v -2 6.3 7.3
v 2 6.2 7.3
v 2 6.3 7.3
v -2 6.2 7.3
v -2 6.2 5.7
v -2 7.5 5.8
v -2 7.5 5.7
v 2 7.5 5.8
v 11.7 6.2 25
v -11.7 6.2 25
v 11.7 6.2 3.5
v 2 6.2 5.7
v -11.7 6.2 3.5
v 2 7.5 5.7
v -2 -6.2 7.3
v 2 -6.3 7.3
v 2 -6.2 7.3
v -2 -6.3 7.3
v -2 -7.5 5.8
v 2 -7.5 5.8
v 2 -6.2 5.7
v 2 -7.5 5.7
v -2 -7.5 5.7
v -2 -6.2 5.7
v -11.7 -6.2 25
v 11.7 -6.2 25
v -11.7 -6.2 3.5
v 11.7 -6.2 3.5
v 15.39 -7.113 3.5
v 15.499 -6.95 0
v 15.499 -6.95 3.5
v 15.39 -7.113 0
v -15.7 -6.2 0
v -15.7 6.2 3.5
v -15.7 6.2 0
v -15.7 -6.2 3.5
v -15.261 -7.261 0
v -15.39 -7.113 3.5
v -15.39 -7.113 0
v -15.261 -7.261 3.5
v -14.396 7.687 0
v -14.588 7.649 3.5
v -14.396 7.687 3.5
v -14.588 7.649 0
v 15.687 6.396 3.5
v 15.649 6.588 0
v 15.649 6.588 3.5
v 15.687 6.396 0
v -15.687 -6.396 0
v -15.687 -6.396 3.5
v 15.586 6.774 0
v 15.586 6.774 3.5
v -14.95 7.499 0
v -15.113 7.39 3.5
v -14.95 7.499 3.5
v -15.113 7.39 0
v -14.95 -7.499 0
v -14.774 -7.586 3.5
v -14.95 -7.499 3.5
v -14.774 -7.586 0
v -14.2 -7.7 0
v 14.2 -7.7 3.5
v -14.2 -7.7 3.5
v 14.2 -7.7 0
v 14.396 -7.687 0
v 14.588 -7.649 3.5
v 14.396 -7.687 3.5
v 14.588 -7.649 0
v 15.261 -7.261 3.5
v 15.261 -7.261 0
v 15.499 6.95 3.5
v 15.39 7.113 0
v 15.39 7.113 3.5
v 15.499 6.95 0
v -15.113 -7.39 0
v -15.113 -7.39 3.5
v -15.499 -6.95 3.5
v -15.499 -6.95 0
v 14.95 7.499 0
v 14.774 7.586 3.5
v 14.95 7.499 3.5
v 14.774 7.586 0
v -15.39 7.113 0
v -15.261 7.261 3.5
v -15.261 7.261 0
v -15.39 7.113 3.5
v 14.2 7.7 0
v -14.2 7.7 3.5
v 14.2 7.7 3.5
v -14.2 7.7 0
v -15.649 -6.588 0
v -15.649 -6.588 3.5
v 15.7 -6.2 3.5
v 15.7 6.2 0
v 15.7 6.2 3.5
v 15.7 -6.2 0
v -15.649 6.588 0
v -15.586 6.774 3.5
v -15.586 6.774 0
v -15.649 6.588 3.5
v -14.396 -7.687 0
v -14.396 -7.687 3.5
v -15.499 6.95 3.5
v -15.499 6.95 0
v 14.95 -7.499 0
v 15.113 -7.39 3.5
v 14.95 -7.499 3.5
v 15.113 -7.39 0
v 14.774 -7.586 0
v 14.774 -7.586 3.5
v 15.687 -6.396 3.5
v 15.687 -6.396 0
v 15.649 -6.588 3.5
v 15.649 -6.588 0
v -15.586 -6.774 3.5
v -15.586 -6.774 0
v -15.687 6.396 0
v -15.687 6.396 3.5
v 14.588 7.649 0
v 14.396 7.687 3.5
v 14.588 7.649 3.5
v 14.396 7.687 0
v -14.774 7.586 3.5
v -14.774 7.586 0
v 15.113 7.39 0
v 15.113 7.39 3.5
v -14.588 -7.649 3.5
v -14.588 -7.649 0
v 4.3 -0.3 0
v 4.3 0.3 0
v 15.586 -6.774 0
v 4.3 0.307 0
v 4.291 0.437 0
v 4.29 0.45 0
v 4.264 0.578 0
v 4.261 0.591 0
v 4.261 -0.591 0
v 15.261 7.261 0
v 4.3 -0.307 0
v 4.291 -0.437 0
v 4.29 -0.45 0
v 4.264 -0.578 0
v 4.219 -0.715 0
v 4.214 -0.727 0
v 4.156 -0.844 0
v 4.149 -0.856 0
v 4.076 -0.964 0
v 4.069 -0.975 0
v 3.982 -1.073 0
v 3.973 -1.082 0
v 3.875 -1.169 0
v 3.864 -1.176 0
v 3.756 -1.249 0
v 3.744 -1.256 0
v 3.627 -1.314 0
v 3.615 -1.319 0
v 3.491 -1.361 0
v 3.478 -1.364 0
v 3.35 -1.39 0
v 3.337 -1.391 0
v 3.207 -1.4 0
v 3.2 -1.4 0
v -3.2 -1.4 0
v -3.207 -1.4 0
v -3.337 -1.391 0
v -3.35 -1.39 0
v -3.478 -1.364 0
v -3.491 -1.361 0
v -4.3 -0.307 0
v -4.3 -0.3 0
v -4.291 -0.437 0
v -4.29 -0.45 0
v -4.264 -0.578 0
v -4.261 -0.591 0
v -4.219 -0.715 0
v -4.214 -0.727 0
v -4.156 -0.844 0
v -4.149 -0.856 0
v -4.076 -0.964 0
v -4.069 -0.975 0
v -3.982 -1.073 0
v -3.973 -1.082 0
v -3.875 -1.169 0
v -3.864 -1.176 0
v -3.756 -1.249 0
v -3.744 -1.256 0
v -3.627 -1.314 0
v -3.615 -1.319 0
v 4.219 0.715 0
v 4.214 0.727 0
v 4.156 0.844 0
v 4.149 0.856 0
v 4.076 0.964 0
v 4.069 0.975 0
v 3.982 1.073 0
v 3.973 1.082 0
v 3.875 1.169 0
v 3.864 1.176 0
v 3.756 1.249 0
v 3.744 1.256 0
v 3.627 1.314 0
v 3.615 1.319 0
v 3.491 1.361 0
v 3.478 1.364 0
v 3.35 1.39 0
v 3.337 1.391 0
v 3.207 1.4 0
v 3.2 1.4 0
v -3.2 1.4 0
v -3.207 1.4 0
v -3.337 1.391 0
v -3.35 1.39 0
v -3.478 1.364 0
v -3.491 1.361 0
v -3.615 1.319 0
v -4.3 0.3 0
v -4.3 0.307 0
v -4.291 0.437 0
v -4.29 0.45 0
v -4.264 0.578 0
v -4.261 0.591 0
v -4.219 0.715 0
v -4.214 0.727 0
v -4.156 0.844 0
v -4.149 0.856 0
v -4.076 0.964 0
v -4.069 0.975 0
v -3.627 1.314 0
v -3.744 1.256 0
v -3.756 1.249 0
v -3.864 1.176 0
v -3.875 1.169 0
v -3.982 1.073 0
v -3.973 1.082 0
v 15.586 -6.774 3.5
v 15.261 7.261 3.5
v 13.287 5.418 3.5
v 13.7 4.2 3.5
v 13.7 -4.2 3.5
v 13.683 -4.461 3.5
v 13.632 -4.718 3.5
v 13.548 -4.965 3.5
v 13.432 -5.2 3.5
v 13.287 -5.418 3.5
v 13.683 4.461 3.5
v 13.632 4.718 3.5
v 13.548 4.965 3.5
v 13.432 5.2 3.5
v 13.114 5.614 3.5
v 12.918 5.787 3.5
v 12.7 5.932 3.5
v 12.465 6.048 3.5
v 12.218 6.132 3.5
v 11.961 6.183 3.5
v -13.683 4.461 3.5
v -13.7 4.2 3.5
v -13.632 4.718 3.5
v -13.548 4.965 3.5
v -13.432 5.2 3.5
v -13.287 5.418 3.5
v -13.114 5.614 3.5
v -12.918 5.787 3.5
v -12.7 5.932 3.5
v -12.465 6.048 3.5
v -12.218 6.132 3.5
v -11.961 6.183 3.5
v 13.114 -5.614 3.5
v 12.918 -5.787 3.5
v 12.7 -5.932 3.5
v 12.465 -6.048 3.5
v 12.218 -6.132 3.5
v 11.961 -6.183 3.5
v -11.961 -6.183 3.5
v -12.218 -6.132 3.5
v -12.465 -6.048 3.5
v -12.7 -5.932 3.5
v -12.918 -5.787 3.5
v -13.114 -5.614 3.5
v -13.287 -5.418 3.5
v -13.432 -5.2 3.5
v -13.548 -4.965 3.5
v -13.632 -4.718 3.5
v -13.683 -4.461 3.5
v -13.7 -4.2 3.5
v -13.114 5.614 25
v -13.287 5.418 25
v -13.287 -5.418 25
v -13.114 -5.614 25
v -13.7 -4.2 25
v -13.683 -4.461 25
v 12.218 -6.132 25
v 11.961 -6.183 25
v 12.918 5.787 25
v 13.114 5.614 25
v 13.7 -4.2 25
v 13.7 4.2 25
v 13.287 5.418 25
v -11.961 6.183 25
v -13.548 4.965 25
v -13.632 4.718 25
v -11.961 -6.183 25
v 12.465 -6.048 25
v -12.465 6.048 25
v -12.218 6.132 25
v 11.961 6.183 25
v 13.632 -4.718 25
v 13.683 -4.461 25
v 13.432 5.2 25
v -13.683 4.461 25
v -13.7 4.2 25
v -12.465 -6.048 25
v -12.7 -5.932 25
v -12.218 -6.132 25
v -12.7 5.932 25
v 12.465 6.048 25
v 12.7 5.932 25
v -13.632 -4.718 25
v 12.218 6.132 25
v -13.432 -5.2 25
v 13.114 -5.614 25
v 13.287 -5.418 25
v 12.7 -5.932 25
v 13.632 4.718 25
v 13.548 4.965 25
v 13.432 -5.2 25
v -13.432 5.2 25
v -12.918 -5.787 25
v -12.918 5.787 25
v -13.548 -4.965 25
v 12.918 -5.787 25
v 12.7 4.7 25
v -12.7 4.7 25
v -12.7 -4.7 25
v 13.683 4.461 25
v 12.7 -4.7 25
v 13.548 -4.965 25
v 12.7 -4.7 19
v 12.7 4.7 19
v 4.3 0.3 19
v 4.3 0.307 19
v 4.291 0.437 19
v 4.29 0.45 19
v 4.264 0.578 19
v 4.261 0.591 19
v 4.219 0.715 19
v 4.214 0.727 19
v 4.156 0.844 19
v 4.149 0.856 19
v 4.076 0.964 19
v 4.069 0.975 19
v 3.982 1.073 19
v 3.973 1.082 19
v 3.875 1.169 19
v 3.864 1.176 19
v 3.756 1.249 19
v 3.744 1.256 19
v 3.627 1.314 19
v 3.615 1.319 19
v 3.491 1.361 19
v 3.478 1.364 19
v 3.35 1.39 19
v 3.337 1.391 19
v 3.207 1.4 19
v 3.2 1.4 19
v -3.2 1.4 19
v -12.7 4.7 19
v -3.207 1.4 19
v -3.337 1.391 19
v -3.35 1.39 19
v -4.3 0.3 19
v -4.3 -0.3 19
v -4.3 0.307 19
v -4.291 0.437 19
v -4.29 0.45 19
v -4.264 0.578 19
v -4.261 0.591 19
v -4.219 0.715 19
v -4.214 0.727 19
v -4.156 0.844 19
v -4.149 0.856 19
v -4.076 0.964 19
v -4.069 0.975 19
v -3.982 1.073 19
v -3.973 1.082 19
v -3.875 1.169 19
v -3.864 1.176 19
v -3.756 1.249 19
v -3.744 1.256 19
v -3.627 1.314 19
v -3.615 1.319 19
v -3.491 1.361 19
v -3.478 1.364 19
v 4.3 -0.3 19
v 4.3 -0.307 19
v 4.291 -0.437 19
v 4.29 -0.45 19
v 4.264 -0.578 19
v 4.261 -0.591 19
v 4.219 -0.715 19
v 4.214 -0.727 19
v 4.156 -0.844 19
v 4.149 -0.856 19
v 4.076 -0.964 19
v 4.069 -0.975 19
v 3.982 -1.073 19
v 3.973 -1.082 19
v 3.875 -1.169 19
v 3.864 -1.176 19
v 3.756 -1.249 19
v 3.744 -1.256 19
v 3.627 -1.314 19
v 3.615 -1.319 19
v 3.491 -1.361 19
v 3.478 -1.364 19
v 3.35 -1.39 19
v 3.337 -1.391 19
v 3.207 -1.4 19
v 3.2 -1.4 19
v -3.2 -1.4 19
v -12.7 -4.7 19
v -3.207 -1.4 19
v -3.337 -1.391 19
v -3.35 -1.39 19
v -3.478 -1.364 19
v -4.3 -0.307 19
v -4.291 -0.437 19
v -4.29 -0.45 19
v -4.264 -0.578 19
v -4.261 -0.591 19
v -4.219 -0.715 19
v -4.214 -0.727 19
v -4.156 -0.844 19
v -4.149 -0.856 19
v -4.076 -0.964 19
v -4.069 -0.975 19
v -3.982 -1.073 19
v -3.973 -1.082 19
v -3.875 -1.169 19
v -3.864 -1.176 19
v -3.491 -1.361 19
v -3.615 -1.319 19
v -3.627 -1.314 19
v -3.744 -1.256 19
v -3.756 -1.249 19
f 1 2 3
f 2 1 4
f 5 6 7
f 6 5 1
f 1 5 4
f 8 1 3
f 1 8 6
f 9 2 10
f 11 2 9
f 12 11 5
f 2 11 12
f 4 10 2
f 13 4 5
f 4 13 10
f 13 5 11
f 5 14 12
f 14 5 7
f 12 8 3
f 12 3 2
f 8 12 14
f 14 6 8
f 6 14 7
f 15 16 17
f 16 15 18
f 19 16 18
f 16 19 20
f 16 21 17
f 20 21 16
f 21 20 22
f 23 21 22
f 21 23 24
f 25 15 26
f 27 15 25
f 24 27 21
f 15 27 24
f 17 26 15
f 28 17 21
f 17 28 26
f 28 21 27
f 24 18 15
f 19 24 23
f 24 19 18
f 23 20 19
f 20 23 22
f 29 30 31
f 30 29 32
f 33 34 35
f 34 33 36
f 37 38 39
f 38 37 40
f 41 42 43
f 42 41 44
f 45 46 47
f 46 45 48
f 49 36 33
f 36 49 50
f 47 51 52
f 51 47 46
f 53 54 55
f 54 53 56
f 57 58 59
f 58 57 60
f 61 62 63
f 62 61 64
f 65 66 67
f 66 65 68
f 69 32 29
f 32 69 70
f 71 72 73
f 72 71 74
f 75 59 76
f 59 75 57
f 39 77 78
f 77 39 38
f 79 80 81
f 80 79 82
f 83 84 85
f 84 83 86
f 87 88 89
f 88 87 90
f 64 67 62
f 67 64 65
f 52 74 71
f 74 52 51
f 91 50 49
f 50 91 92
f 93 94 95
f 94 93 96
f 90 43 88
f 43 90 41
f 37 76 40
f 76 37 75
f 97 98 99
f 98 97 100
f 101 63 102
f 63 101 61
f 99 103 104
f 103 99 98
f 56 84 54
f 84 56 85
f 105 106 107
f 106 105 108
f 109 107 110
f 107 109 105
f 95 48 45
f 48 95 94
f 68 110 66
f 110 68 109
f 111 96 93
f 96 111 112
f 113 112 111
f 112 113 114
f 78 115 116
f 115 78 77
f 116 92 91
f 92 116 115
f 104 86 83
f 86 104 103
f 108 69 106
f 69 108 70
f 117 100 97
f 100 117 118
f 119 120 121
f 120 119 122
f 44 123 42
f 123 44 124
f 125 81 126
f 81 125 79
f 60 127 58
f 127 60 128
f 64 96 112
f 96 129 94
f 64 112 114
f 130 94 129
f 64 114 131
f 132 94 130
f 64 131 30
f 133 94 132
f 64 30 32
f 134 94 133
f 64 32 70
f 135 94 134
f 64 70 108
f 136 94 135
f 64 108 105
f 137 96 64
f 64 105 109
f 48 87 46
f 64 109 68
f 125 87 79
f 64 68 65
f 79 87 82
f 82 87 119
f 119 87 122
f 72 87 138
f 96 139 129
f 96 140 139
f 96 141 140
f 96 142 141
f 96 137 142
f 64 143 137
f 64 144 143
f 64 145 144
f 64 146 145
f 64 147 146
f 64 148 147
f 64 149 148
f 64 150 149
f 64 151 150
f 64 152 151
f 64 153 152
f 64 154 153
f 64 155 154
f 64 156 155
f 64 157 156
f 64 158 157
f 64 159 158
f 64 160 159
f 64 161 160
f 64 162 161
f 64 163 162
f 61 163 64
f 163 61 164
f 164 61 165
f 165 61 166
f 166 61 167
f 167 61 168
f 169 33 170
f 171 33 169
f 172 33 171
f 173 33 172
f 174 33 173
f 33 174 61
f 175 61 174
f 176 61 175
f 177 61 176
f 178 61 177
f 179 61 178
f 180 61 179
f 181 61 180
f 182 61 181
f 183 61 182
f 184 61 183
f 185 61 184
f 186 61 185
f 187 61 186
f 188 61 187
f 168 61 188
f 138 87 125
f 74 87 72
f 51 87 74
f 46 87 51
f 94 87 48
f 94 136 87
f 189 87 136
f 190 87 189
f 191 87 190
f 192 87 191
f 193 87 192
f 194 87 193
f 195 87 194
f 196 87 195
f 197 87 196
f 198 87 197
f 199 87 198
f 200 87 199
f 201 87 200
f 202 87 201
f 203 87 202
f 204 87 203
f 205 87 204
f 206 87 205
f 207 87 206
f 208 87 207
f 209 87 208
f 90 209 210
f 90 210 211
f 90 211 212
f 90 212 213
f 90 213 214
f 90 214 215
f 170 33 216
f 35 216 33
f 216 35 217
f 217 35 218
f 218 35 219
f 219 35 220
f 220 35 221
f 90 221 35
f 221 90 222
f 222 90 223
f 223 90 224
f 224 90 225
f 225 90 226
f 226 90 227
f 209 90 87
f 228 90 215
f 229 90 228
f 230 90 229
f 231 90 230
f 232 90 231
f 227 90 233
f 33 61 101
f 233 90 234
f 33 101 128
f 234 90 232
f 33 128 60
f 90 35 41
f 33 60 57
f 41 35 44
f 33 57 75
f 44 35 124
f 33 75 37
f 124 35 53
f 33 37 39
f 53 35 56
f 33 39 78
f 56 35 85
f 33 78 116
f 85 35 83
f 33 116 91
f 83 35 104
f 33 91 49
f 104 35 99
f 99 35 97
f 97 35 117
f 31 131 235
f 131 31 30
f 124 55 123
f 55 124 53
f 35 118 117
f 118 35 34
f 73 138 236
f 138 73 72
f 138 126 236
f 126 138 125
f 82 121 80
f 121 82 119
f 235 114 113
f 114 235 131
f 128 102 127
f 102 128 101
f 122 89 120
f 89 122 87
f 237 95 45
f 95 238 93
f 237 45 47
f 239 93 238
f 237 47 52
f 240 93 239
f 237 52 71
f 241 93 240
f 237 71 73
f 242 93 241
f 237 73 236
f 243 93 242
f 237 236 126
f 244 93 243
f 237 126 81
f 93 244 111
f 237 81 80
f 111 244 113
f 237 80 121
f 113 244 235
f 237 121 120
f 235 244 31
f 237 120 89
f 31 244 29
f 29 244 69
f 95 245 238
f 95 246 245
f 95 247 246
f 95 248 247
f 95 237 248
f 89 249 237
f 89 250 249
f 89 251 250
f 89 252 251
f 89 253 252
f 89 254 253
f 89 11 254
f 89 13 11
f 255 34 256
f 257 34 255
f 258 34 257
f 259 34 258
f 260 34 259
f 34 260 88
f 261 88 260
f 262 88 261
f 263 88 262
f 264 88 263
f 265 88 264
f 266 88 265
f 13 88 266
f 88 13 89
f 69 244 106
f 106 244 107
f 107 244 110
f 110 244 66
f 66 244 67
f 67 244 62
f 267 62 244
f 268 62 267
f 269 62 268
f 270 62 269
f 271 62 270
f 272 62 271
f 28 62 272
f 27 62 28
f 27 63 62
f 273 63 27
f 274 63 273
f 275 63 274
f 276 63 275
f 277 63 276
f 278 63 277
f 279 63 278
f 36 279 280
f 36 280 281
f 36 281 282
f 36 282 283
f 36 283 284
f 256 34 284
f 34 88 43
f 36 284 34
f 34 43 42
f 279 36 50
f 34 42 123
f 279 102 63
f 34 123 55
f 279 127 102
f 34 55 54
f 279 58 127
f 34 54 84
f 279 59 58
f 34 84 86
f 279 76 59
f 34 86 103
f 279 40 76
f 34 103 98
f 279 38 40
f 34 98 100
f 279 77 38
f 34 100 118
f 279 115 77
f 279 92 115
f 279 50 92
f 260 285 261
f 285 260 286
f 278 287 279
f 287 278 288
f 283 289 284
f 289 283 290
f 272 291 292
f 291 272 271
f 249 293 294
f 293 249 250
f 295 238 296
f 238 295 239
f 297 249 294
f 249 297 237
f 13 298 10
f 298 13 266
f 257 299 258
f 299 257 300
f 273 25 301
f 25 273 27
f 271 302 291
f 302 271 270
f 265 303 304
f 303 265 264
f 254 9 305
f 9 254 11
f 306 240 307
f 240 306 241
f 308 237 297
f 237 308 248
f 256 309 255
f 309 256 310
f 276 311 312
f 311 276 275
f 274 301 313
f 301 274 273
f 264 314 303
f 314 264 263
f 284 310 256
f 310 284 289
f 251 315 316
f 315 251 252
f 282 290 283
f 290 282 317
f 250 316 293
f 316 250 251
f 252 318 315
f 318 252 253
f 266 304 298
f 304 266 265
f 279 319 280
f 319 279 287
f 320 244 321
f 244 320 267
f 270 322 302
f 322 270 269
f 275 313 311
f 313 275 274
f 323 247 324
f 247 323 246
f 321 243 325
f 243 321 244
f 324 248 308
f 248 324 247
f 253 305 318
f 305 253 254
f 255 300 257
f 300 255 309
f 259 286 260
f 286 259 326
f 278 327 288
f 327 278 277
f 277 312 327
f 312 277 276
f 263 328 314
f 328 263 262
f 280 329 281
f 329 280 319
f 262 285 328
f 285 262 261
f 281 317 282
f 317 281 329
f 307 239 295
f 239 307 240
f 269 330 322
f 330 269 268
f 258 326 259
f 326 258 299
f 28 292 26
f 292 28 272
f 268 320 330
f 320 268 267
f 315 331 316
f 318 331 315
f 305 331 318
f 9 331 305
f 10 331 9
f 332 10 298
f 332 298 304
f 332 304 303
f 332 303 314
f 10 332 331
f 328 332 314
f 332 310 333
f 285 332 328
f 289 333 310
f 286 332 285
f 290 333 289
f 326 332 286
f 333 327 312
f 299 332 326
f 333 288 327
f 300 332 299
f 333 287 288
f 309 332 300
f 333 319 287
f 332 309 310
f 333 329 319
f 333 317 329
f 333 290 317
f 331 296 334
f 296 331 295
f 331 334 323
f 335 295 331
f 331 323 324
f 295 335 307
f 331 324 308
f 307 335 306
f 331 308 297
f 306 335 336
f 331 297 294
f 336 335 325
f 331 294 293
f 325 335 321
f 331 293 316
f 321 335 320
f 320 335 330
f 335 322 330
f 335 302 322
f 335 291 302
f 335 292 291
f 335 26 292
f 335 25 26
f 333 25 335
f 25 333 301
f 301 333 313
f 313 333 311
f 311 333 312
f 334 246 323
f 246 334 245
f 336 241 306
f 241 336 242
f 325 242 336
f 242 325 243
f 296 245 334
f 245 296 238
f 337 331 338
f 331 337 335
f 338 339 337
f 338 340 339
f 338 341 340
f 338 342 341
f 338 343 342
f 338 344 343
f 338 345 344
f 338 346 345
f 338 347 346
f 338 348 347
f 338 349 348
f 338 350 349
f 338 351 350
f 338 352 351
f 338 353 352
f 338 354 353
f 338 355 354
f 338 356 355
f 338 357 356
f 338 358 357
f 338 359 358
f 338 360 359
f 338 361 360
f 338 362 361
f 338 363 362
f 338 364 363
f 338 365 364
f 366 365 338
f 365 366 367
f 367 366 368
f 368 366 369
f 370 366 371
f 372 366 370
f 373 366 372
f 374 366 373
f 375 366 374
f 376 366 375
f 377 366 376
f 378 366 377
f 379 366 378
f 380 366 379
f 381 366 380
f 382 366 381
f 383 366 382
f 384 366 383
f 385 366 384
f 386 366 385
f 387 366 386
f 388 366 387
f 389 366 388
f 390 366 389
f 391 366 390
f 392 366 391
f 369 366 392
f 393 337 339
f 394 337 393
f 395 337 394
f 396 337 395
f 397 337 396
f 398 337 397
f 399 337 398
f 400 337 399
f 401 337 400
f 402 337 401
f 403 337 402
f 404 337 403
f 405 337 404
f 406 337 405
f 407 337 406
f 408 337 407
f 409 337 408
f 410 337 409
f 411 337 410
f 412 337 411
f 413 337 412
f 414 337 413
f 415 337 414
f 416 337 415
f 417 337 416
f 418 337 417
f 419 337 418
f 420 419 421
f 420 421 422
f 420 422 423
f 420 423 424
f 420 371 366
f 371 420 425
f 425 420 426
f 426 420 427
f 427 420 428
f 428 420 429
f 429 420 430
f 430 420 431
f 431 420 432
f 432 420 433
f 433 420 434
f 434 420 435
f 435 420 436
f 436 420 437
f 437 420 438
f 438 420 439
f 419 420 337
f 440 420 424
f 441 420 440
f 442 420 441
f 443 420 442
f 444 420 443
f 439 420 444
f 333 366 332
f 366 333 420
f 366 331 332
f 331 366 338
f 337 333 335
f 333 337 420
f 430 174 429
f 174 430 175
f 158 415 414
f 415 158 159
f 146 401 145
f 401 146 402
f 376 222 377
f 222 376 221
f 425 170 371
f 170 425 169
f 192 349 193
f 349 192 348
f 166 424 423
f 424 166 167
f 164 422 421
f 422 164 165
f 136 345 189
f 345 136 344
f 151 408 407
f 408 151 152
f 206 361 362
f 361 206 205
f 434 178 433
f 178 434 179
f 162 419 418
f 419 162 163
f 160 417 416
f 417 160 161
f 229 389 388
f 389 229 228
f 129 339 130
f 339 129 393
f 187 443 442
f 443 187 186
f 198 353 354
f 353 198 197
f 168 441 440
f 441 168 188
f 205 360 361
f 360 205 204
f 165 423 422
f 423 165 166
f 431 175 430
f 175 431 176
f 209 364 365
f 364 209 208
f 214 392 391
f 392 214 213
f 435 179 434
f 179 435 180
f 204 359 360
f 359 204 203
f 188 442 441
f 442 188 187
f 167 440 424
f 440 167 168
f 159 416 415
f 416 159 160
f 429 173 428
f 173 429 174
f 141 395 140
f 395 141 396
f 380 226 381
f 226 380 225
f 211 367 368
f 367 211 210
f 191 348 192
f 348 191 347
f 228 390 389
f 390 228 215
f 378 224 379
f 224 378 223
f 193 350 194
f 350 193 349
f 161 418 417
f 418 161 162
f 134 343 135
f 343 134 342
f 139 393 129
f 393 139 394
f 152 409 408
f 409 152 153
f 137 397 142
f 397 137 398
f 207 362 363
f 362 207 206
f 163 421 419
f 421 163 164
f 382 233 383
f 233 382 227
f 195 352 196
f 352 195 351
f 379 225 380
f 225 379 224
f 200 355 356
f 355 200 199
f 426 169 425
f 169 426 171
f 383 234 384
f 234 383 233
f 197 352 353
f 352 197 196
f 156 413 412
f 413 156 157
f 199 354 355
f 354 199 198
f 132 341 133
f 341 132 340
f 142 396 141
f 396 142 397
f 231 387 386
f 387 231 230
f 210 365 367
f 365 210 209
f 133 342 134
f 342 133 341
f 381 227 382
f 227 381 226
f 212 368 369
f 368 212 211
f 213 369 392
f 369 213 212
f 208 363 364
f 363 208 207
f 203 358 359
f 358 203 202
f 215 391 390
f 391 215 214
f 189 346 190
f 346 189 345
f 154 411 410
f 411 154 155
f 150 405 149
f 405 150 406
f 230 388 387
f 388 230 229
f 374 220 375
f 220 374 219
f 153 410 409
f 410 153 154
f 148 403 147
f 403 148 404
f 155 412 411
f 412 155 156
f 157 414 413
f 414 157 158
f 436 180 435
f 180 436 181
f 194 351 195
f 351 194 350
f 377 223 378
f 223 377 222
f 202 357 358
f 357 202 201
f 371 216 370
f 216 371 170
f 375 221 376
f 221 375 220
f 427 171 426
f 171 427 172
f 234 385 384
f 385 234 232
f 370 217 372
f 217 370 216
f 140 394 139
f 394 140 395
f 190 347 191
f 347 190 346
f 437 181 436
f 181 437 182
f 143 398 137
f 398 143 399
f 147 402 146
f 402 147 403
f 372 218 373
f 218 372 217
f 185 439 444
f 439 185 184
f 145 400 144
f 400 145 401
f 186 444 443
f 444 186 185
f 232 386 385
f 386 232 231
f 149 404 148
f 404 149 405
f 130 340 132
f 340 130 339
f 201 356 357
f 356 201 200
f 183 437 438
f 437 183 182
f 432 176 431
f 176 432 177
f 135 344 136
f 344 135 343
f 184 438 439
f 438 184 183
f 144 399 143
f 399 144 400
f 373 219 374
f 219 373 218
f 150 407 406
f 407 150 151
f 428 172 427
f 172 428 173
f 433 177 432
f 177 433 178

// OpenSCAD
// file: parameters.scad
// ============================================
// MODULAR CABLE ORGANIZER - SHARED PARAMETERS
// ============================================
// All dimensions in mm - include this in all files
// ============================================

$fn = 48;

// === TOLERANCES ===
clearance = 0.3;
port_clearance = 0.1;  // Extra clearance for port openings (reduced - 0.2 was too loose for USB-C)
wall = 1.6;

// === SLOT DIMENSIONS (2:1 aspect ratio) - scaled to 2/3 ===
slot_width = 32;  // Standard wide slot for larger connectors
slot_width_narrow = 16;  // Narrow slot for compact connectors (USB-C, micro-USB, USB-A, Lightning, 3.5mm)
slot_height = 16;  // Height is same for both wide and narrow
slot_depth = 4;  // Reduced from 6mm - less frame depth needed

// === FRAME STRUCTURE ===
frame_wall = 2.0;   // Wall between slots - 6 layers @ 0.4mm nozzle for strength
frame_border = 6;  // Increased by 10mm for mounting holes with countersink
frame_back = 2;     // Slightly thicker for snap catch strength
mount_hole_dia = 3;
countersink_dia = 6;  // Diameter of countersink for screw heads
countersink_depth = 2;  // Depth of countersink

// === DEFAULT GRID (can be overridden in individual files) ===
grid_cols = 2;
grid_rows = 2;

// === INSERT BASE DIMENSIONS ===
insert_width = slot_width - (2 * clearance);
insert_height = slot_height - (2 * clearance);
insert_base_depth = slot_depth - 0.5;

// === NARROW INSERT BASE DIMENSIONS ===
insert_width_narrow = slot_width_narrow - (2 * clearance);
insert_height_narrow = slot_height - (2 * clearance);

// === INSERT BODY (protrudes from frame) ===
insert_body_width = insert_width - 4;
insert_body_height = insert_height - 3;
insert_body_depth = 15.5;  // Standardized depth (USB-B 15.26mm + 0.25mm buffer) - all inserts same height
insert_top_thick = 1.5;  // Top platform thickness

// === NARROW INSERT BODY (protrudes from frame) ===
insert_body_width_narrow = insert_width_narrow - 4;
insert_body_height_narrow = insert_height_narrow - 3;

// === SNAP TABS (on neck/body - catch on back plate) ===
snap_tab_width = 4;
snap_tab_protrude = 1.2;  // How far tab sticks out from body
snap_tab_thick = 1.5;     // Z thickness of tab
snap_tab_offset = 2.2;      // Distance from base to tab bottom on insert (increased to clear frame)

// === CONNECTOR PORT DIMENSIONS & BODY DEPTHS ===
// Port dimensions from reference blueprints
// Body depths sized to match typical male connector lengths

// USB-C: 8.4 x 2.6mm, male connector ~9mm
usbc_w = 8.4;
usbc_h = 2.6;
usbc_r = 1.0;
usbc_body_depth = 15.5;  // Standardized depth (USB-B 15.26mm + 0.25mm buffer)
// NO RETENTION RIBS for USB-C (removed per user request)

// USB-A: 13.0 x 4.5mm (standard male USB-A height)
usba_w = 13.0;
usba_h = 4.5;  // Match actual male USB-A height
usba_r = 0.5;
usba_body_depth = 15.5;  // Standardized depth (USB-B 15.26mm + 0.25mm buffer)
usba_retention_rib_depth = 5.0;  // Distance from front (moved back 1mm so ribs don't break)
usba_retention_rib_size = 0.15;  // How far ribs protrude inward

// USB Mini: 6.9 x 3.0mm, male connector ~9mm
usb_mini_w = 6.9;
usb_mini_h = 3.0;
usb_mini_r = 0.5;
usb_mini_body_depth = 15.5;  // Standardized depth (USB-B 15.26mm + 0.25mm buffer)
usb_mini_retention_rib_depth = 3.5;  // Distance from front where retention ribs start
usb_mini_retention_rib_size = 0.125;  // Reduced to half (was 0.25)

// USB Micro-B: 7.4 x 1.8mm (wider to fit corners of trapezoid)
usb_micro_w = 7.4;  // Increased width for corners
usb_micro_h = 1.8;
usb_micro_r = 0.3;
usb_micro_body_depth = 15.5;  // Standardized depth (USB-B 15.26mm + 0.25mm buffer)
usb_micro_retention_rib_depth = 4.5;  // Distance from front (moved back 1mm so ribs don't break)
usb_micro_retention_rib_size = 0.125;  // How far ribs protrude inward

// USB-B: 8.75 x 7.78mm (standard male USB-B height)
usb_b_w = 8.75;  // Width at bottom (wider)
usb_b_h = 7.78;  // Match actual male USB-B height (reduced from 7.9)
usb_b_r = 0.6;   // Corner radius
usb_b_top_inset = 0.9;  // How much narrower the top is (creates trapezoid shape)
usb_b_body_depth = 15.5;  // Standardized depth (15.26mm connector + 0.25mm buffer)
usb_b_retention_rib_depth = 5.5;  // Distance from front (moved back 1mm so ribs don't break)
usb_b_retention_rib_size = 0.15;  // How far ribs protrude inward

// Lightning: 7.6 x 1.5mm, male connector ~8mm (measured from actual connector)
lightning_w = 7.6;
lightning_h = 1.5;
lightning_r = 0.5;
lightning_body_depth = 15.5;  // Standardized depth (USB-B 15.26mm + 0.25mm buffer)
lightning_retention_rib_depth = 4.0;  // Distance from front (moved back 1mm so ribs don't break)
lightning_retention_rib_size = 0.1;   // How far ribs protrude inward

// HDMI: 14.65 x 4.45mm (standard male HDMI height)
hdmi_w = 14.65;
hdmi_h = 4.45;  // Match actual male HDMI height
hdmi_r = 0.5;
hdmi_body_depth = 15.5;  // Standardized depth (USB-B 15.26mm + 0.25mm buffer)
hdmi_retention_rib_depth = 6.0;  // Distance from front (moved back 1mm so ribs don't break)
hdmi_retention_rib_size = 0.1;   // How far ribs protrude inward

// 3.5mm Audio Jack: standard 3.5mm (1/8") diameter
audio_jack_dia = 3.6;  // 3.5mm + 0.1mm for less snug fit
audio_jack_body_depth = 15.5;  // Standardized depth (USB-B 15.26mm + 0.25mm buffer)
// Ring positions for TRS/TRRS ribs (tip, ring1, ring2 from front)
audio_jack_ring1 = 3.5;  // First ring position from front
audio_jack_ring2 = 6.5;  // Second ring position from front

// Blank/Label: recessed area for label
label_w = 30;
label_h = 12;
label_depth = 0.8;

// AC Power Plug: asymmetric holes for polarity (US 2-prong)
// Prongs are VERTICAL (tall and thin)
// Hot prong (narrower): 1.6mm wide x 6.5mm tall
// Neutral prong (wider): 1.6mm wide x 8.5mm tall (increased)
power_hot_w = 1.6;   // Width (thin dimension)
power_hot_h = 6.5;   // Height (tall dimension)
power_neutral_w = 1.6;   // Width (thin dimension)
power_neutral_h = 8.5;   // Height (tall dimension, increased from 8.1)
power_prong_spacing = 12.7;  // 0.5" center-to-center
power_body_depth = 15.5;  // Standardized depth (USB-B 15.26mm + 0.25mm buffer)

// === CALCULATED VALUES ===
frame_total_depth = frame_back + slot_depth;
grid_width = (grid_cols * slot_width) + ((grid_cols - 1) * frame_wall);
grid_height = (grid_rows * slot_height) + ((grid_rows - 1) * frame_wall);
frame_width = grid_width + (2 * frame_border);
frame_height_total = grid_height + (2 * frame_border);
insert_total_depth = insert_base_depth + insert_body_depth;
// main file
// ============================================
// UNIVERSAL CONNECTOR SYSTEM - BASE INSERT MODULE
// ============================================
// Extended insert design with:
// - Internal PCB cavity for signal routing
// - 24-pin universal connector interface on rear
// - Compatible with existing frame system
// ============================================

include <insert_base.scad>

// === UNIVERSAL CONNECTOR PARAMETERS ===

// 24-pin connector dimensions (2x12 array, 1.27mm pitch)
uc_pin_pitch = 1.27;
uc_pin_rows = 2;
uc_pin_cols = 12;
uc_connector_width = (uc_pin_cols - 1) * uc_pin_pitch + 3.0;  // ~17mm with housing
uc_connector_height = (uc_pin_rows - 1) * uc_pin_pitch + 2.5; // ~4mm with housing
uc_connector_depth = 4.0;  // Connector mating depth

// PCB cavity dimensions
pcb_thickness = 1.0;
pcb_clearance = 0.3;
pcb_cavity_width = insert_body_width - 2;   // Leave 1mm wall on each side
pcb_cavity_height = insert_body_height - 3; // Leave wall for structural integrity
pcb_cavity_depth = 8.0;  // Depth for PCB + components

// Extended body for universal connector
uc_body_extension = 6.0;  // Extra depth for 24-pin connector housing

// === UNIVERSAL INSERT BASE (WIDE) ===
// Accepts original connector on front, has 24-pin interface on rear
module insert_universal_base_custom(body_depth, original_port_depth) {
    total_depth = insert_base_depth + body_depth + uc_body_extension;
    pcb_start_z = insert_base_depth + original_port_depth;
    
    difference() {
        union() {
            // Base plate (sits in frame slot) - same as original
            rounded_box_rect(insert_width, insert_height, insert_base_depth, 1.5);
            
            // Extended body (protrudes out front)
            translate([0, 0, insert_base_depth])
                rounded_box_rect(insert_body_width, insert_body_height, 
                                body_depth + uc_body_extension, 2);
            
            // Snap tabs
            snap_tabs_all();
        }
        
        // PCB cavity (from behind original connector to near rear)
        translate([0, 0, pcb_start_z])
            pcb_cavity(pcb_cavity_depth);
        
        // 24-pin connector opening on rear face
        translate([0, 0, total_depth - uc_connector_depth - 0.1])
            linear_extrude(uc_connector_depth + 0.2)
            uc_connector_opening();
        
        // Wire routing channels from PCB to 24-pin connector
        translate([0, 0, pcb_start_z + pcb_cavity_depth - 1])
            wire_routing_channels();
    }
}

// === UNIVERSAL INSERT BASE (NARROW) ===
module insert_universal_base_narrow_custom(body_depth, original_port_depth) {
    total_depth = insert_base_depth + body_depth + uc_body_extension;
    pcb_start_z = insert_base_depth + original_port_depth;
    
    // Narrow PCB dimensions
    pcb_cavity_width_narrow = insert_body_width_narrow - 1.5;
    
    difference() {
        union() {
            // Narrow base plate
            rounded_box_rect(insert_width_narrow, insert_height_narrow, 
                            insert_base_depth, 1.5);
            
            // Extended narrow body
            translate([0, 0, insert_base_depth])
                rounded_box_rect(insert_body_width_narrow, insert_body_height_narrow, 
                                body_depth + uc_body_extension, 2);
            
            // Snap tabs (narrow version)
            snap_tabs_narrow();
        }
        
        // Smaller PCB cavity for narrow insert
        translate([0, 0, pcb_start_z])
            pcb_cavity_narrow(pcb_cavity_depth);
        
        // 24-pin connector opening (same size, centered)
        translate([0, 0, total_depth - uc_connector_depth - 0.1])
            linear_extrude(uc_connector_depth + 0.2)
            uc_connector_opening();
    }
}

// === PCB CAVITY MODULE ===
module pcb_cavity(depth) {
    // Main PCB slot
    translate([0, 0, depth/2])
        cube([pcb_cavity_width, pcb_cavity_height, depth], center=true);
    
    // Component clearance on top of PCB
    translate([0, 0, pcb_thickness + depth/2])
        cube([pcb_cavity_width - 2, pcb_cavity_height - 2, depth], center=true);
}

module pcb_cavity_narrow(depth) {
    narrow_pcb_w = insert_body_width_narrow - 1.5;
    narrow_pcb_h = insert_body_height_narrow - 2;
    
    translate([0, 0, depth/2])
        cube([narrow_pcb_w, narrow_pcb_h, depth], center=true);
}

// === 24-PIN CONNECTOR OPENING ===
module uc_connector_opening() {
    // Rectangular opening for 24-pin connector
    // Slightly oversized for tolerance
    offset(r=0.2)
        square([uc_connector_width, uc_connector_height], center=true);
}

// === 24-PIN CONTACT ARRAY (for visualization) ===
module uc_pin_array() {
    // Visual representation of the 24 pins
    for (row = [0:uc_pin_rows-1]) {
        for (col = [0:uc_pin_cols-1]) {
            x = (col - (uc_pin_cols-1)/2) * uc_pin_pitch;
            y = (row - (uc_pin_rows-1)/2) * uc_pin_pitch;
            translate([x, y, 0])
                cylinder(d=0.8, h=3, $fn=12);
        }
    }
}

// === WIRE ROUTING CHANNELS ===
module wire_routing_channels() {
    // Channels for routing wires from PCB to 24-pin connector
    channel_width = 1.5;
    channel_height = 2.0;
    
    // Left side channel
    translate([-pcb_cavity_width/4, 0, channel_height/2])
        cube([channel_width, pcb_cavity_height - 2, channel_height + 4], center=true);
    
    // Right side channel  
    translate([pcb_cavity_width/4, 0, channel_height/2])
        cube([channel_width, pcb_cavity_height - 2, channel_height + 4], center=true);
    
    // Center channel
    translate([0, 0, channel_height/2])
        cube([channel_width, pcb_cavity_height - 2, channel_height + 4], center=true);
}

// === UNIVERSAL USB-C ADAPTER INSERT ===
module insert_universal_usbc() {
    difference() {
        insert_universal_base_custom(usbc_body_depth, usbc_body_depth);
        
        // Original USB-C port opening (front)
        translate([0, 0, -0.1])
            linear_extrude(insert_base_depth + usbc_body_depth + 0.2)
            offset(r=port_clearance)
            port_usbc();
    }
}

// === UNIVERSAL USB-A ADAPTER INSERT ===
module insert_universal_usba() {
    difference() {
        insert_universal_base_custom(usba_body_depth, usba_body_depth);
        
        // Original USB-A port opening (front)
        translate([0, 0, -0.1])
            linear_extrude(insert_base_depth + usba_body_depth + 0.2)
            offset(r=port_clearance)
            port_usba();
    }
    
    // Retention ribs
    rib_z = insert_base_depth + usba_retention_rib_depth;
    for (side = [-1, 1]) {
        translate([side * (usba_w/2 - usba_retention_rib_size), 0, rib_z])
            cube([usba_retention_rib_size * 2, usba_h - 1, 1.5], center=true);
    }
}

// === UNIVERSAL HDMI ADAPTER INSERT ===
module insert_universal_hdmi() {
    difference() {
        insert_universal_base_custom(hdmi_body_depth, hdmi_body_depth);
        
        // Original HDMI port opening (front)
        translate([0, 0, -0.1])
            linear_extrude(insert_base_depth + hdmi_body_depth + 0.2)
            offset(r=port_clearance)
            port_hdmi();
        
        // Extra cavity for active converter IC
        translate([0, 0, insert_base_depth + hdmi_body_depth + 2])
            cube([20, 8, 6], center=true);
    }
}

// === UNIVERSAL DISPLAYPORT ADAPTER INSERT ===
// DisplayPort dimensions (not in original parameters.scad)
dp_w = 16.1;  // DisplayPort width
dp_h = 4.8;   // DisplayPort height
dp_r = 0.5;   // Corner radius
dp_body_depth = 14;

module port_displayport() {
    // DisplayPort is asymmetric - one corner is clipped
    hull() {
        // Top left (clipped corner)
        translate([-(dp_w/2 - dp_r - 1.5), (dp_h/2 - dp_r)])
            circle(r=dp_r);
        // Top right
        translate([(dp_w/2 - dp_r), (dp_h/2 - dp_r)])
            circle(r=dp_r);
        // Bottom corners (full width)
        for (x = [-1, 1])
            translate([x * (dp_w/2 - dp_r), -(dp_h/2 - dp_r)])
                circle(r=dp_r);
    }
}

module insert_universal_displayport() {
    difference() {
        insert_universal_base_custom(dp_body_depth, dp_body_depth);
        
        // DisplayPort opening (front)
        translate([0, 0, -0.1])
            linear_extrude(insert_base_depth + dp_body_depth + 0.2)
            offset(r=port_clearance)
            port_displayport();
    }
}

// === UNIVERSAL LIGHTNING ADAPTER INSERT (NARROW) ===
module insert_universal_lightning_narrow() {
    difference() {
        insert_universal_base_narrow_custom(lightning_body_depth, lightning_body_depth);
        
        // Lightning port opening
        translate([0, 0, -0.1])
            linear_extrude(insert_base_depth + lightning_body_depth + 0.2)
            offset(r=port_clearance)
            port_lightning();
    }
}

// === UNIVERSAL AUDIO JACK ADAPTER INSERT (NARROW) ===
module insert_universal_audio_narrow() {
    difference() {
        insert_universal_base_narrow_custom(audio_jack_body_depth, audio_jack_body_depth);
        
        // Audio jack opening
        translate([0, 0, -0.1])
            linear_extrude(insert_base_depth + audio_jack_body_depth + 0.2)
            offset(r=port_clearance)
            port_audio_jack();
    }
}

// === UNIVERSAL MALE TERMINATOR ===
// The cable-end connector that plugs into universal inserts
module universal_male_terminator() {
    housing_width = 20;
    housing_height = 8;
    housing_depth = 16;
    plug_depth = uc_connector_depth - 0.3;  // Slightly shorter for clearance
    
    difference() {
        union() {
            // Main housing body
            translate([0, 0, housing_depth/2])
                rounded_box_rect(housing_width, housing_height, housing_depth, 2);
            
            // 24-pin male plug extension
            translate([0, 0, housing_depth])
                rounded_box_rect(uc_connector_width - 0.4, uc_connector_height - 0.4, 
                                plug_depth, 0.5);
        }
        
        // Cable entry hole (rear)
        translate([0, 0, -0.1])
            linear_extrude(4)
            circle(d=6);
        
        // Internal wire cavity
        translate([0, 0, 3])
            cube([housing_width - 4, housing_height - 3, housing_depth], center=true);
        
        // Strain relief slots
        for (x = [-1, 1]) {
            translate([x * 4, 0, 2])
                cube([2, housing_height + 1, 3], center=true);
        }
    }
    
    // Pin contacts (visualization)
    color("gold")
    translate([0, 0, housing_depth + plug_depth - 2])
        uc_pin_array();
}

// === PASS-THROUGH INSERT (24-pin to 24-pin) ===
// For extending universal cables
module insert_universal_passthrough() {
    total_depth = insert_base_depth + insert_body_depth + uc_body_extension;
    
    difference() {
        union() {
            // Base plate
            rounded_box_rect(insert_width, insert_height, insert_base_depth, 1.5);
            
            // Extended body
            translate([0, 0, insert_base_depth])
                rounded_box_rect(insert_body_width, insert_body_height, 
                                insert_body_depth + uc_body_extension, 2);
            
            snap_tabs_all();
        }
        
        // Front 24-pin opening
        translate([0, 0, -0.1])
            linear_extrude(insert_base_depth + 3)
            uc_connector_opening();
        
        // Rear 24-pin opening
        translate([0, 0, total_depth - uc_connector_depth - 0.1])
            linear_extrude(uc_connector_depth + 0.2)
            uc_connector_opening();
        
        // Through-channel for direct wiring
        translate([0, 0, insert_base_depth + 2])
            cube([uc_connector_width - 2, uc_connector_height + 2, 
                  insert_body_depth + uc_body_extension], center=true);
    }
}

// === DEMO: CROSS-SECTION VIEW ===
module demo_universal_insert_cutaway() {
    difference() {
        insert_universal_usbc();
        
        // Cut away half for cross-section view
        translate([0, -20, -1])
            cube([40, 40, 40]);
    }
}

// === DEMO: ALL UNIVERSAL INSERTS ===
module demo_universal_all() {
    spacing = 40;
    
    // Row 1: Wide inserts
    translate([0, 0, 0]) insert_universal_usbc();
    translate([spacing, 0, 0]) insert_universal_usba();
    translate([spacing*2, 0, 0]) insert_universal_hdmi();
    translate([spacing*3, 0, 0]) insert_universal_displayport();
    
    // Row 2: Narrow inserts and terminator
    translate([0, -25, 0]) insert_universal_lightning_narrow();
    translate([spacing/2, -25, 0]) insert_universal_audio_narrow();
    translate([spacing*1.5, -25, 0]) insert_universal_passthrough();
    translate([spacing*2.5, -25, 0]) universal_male_terminator();
}

// === RENDER OPTIONS ===
// Uncomment one to render:

// Single USB-C universal adapter (default)
insert_universal_usbc();

// Cross-section view
// demo_universal_insert_cutaway();

// All universal inserts
// demo_universal_all();

// Male terminator only
// universal_male_terminator();

// Pass-through insert
// insert_universal_passthrough();
